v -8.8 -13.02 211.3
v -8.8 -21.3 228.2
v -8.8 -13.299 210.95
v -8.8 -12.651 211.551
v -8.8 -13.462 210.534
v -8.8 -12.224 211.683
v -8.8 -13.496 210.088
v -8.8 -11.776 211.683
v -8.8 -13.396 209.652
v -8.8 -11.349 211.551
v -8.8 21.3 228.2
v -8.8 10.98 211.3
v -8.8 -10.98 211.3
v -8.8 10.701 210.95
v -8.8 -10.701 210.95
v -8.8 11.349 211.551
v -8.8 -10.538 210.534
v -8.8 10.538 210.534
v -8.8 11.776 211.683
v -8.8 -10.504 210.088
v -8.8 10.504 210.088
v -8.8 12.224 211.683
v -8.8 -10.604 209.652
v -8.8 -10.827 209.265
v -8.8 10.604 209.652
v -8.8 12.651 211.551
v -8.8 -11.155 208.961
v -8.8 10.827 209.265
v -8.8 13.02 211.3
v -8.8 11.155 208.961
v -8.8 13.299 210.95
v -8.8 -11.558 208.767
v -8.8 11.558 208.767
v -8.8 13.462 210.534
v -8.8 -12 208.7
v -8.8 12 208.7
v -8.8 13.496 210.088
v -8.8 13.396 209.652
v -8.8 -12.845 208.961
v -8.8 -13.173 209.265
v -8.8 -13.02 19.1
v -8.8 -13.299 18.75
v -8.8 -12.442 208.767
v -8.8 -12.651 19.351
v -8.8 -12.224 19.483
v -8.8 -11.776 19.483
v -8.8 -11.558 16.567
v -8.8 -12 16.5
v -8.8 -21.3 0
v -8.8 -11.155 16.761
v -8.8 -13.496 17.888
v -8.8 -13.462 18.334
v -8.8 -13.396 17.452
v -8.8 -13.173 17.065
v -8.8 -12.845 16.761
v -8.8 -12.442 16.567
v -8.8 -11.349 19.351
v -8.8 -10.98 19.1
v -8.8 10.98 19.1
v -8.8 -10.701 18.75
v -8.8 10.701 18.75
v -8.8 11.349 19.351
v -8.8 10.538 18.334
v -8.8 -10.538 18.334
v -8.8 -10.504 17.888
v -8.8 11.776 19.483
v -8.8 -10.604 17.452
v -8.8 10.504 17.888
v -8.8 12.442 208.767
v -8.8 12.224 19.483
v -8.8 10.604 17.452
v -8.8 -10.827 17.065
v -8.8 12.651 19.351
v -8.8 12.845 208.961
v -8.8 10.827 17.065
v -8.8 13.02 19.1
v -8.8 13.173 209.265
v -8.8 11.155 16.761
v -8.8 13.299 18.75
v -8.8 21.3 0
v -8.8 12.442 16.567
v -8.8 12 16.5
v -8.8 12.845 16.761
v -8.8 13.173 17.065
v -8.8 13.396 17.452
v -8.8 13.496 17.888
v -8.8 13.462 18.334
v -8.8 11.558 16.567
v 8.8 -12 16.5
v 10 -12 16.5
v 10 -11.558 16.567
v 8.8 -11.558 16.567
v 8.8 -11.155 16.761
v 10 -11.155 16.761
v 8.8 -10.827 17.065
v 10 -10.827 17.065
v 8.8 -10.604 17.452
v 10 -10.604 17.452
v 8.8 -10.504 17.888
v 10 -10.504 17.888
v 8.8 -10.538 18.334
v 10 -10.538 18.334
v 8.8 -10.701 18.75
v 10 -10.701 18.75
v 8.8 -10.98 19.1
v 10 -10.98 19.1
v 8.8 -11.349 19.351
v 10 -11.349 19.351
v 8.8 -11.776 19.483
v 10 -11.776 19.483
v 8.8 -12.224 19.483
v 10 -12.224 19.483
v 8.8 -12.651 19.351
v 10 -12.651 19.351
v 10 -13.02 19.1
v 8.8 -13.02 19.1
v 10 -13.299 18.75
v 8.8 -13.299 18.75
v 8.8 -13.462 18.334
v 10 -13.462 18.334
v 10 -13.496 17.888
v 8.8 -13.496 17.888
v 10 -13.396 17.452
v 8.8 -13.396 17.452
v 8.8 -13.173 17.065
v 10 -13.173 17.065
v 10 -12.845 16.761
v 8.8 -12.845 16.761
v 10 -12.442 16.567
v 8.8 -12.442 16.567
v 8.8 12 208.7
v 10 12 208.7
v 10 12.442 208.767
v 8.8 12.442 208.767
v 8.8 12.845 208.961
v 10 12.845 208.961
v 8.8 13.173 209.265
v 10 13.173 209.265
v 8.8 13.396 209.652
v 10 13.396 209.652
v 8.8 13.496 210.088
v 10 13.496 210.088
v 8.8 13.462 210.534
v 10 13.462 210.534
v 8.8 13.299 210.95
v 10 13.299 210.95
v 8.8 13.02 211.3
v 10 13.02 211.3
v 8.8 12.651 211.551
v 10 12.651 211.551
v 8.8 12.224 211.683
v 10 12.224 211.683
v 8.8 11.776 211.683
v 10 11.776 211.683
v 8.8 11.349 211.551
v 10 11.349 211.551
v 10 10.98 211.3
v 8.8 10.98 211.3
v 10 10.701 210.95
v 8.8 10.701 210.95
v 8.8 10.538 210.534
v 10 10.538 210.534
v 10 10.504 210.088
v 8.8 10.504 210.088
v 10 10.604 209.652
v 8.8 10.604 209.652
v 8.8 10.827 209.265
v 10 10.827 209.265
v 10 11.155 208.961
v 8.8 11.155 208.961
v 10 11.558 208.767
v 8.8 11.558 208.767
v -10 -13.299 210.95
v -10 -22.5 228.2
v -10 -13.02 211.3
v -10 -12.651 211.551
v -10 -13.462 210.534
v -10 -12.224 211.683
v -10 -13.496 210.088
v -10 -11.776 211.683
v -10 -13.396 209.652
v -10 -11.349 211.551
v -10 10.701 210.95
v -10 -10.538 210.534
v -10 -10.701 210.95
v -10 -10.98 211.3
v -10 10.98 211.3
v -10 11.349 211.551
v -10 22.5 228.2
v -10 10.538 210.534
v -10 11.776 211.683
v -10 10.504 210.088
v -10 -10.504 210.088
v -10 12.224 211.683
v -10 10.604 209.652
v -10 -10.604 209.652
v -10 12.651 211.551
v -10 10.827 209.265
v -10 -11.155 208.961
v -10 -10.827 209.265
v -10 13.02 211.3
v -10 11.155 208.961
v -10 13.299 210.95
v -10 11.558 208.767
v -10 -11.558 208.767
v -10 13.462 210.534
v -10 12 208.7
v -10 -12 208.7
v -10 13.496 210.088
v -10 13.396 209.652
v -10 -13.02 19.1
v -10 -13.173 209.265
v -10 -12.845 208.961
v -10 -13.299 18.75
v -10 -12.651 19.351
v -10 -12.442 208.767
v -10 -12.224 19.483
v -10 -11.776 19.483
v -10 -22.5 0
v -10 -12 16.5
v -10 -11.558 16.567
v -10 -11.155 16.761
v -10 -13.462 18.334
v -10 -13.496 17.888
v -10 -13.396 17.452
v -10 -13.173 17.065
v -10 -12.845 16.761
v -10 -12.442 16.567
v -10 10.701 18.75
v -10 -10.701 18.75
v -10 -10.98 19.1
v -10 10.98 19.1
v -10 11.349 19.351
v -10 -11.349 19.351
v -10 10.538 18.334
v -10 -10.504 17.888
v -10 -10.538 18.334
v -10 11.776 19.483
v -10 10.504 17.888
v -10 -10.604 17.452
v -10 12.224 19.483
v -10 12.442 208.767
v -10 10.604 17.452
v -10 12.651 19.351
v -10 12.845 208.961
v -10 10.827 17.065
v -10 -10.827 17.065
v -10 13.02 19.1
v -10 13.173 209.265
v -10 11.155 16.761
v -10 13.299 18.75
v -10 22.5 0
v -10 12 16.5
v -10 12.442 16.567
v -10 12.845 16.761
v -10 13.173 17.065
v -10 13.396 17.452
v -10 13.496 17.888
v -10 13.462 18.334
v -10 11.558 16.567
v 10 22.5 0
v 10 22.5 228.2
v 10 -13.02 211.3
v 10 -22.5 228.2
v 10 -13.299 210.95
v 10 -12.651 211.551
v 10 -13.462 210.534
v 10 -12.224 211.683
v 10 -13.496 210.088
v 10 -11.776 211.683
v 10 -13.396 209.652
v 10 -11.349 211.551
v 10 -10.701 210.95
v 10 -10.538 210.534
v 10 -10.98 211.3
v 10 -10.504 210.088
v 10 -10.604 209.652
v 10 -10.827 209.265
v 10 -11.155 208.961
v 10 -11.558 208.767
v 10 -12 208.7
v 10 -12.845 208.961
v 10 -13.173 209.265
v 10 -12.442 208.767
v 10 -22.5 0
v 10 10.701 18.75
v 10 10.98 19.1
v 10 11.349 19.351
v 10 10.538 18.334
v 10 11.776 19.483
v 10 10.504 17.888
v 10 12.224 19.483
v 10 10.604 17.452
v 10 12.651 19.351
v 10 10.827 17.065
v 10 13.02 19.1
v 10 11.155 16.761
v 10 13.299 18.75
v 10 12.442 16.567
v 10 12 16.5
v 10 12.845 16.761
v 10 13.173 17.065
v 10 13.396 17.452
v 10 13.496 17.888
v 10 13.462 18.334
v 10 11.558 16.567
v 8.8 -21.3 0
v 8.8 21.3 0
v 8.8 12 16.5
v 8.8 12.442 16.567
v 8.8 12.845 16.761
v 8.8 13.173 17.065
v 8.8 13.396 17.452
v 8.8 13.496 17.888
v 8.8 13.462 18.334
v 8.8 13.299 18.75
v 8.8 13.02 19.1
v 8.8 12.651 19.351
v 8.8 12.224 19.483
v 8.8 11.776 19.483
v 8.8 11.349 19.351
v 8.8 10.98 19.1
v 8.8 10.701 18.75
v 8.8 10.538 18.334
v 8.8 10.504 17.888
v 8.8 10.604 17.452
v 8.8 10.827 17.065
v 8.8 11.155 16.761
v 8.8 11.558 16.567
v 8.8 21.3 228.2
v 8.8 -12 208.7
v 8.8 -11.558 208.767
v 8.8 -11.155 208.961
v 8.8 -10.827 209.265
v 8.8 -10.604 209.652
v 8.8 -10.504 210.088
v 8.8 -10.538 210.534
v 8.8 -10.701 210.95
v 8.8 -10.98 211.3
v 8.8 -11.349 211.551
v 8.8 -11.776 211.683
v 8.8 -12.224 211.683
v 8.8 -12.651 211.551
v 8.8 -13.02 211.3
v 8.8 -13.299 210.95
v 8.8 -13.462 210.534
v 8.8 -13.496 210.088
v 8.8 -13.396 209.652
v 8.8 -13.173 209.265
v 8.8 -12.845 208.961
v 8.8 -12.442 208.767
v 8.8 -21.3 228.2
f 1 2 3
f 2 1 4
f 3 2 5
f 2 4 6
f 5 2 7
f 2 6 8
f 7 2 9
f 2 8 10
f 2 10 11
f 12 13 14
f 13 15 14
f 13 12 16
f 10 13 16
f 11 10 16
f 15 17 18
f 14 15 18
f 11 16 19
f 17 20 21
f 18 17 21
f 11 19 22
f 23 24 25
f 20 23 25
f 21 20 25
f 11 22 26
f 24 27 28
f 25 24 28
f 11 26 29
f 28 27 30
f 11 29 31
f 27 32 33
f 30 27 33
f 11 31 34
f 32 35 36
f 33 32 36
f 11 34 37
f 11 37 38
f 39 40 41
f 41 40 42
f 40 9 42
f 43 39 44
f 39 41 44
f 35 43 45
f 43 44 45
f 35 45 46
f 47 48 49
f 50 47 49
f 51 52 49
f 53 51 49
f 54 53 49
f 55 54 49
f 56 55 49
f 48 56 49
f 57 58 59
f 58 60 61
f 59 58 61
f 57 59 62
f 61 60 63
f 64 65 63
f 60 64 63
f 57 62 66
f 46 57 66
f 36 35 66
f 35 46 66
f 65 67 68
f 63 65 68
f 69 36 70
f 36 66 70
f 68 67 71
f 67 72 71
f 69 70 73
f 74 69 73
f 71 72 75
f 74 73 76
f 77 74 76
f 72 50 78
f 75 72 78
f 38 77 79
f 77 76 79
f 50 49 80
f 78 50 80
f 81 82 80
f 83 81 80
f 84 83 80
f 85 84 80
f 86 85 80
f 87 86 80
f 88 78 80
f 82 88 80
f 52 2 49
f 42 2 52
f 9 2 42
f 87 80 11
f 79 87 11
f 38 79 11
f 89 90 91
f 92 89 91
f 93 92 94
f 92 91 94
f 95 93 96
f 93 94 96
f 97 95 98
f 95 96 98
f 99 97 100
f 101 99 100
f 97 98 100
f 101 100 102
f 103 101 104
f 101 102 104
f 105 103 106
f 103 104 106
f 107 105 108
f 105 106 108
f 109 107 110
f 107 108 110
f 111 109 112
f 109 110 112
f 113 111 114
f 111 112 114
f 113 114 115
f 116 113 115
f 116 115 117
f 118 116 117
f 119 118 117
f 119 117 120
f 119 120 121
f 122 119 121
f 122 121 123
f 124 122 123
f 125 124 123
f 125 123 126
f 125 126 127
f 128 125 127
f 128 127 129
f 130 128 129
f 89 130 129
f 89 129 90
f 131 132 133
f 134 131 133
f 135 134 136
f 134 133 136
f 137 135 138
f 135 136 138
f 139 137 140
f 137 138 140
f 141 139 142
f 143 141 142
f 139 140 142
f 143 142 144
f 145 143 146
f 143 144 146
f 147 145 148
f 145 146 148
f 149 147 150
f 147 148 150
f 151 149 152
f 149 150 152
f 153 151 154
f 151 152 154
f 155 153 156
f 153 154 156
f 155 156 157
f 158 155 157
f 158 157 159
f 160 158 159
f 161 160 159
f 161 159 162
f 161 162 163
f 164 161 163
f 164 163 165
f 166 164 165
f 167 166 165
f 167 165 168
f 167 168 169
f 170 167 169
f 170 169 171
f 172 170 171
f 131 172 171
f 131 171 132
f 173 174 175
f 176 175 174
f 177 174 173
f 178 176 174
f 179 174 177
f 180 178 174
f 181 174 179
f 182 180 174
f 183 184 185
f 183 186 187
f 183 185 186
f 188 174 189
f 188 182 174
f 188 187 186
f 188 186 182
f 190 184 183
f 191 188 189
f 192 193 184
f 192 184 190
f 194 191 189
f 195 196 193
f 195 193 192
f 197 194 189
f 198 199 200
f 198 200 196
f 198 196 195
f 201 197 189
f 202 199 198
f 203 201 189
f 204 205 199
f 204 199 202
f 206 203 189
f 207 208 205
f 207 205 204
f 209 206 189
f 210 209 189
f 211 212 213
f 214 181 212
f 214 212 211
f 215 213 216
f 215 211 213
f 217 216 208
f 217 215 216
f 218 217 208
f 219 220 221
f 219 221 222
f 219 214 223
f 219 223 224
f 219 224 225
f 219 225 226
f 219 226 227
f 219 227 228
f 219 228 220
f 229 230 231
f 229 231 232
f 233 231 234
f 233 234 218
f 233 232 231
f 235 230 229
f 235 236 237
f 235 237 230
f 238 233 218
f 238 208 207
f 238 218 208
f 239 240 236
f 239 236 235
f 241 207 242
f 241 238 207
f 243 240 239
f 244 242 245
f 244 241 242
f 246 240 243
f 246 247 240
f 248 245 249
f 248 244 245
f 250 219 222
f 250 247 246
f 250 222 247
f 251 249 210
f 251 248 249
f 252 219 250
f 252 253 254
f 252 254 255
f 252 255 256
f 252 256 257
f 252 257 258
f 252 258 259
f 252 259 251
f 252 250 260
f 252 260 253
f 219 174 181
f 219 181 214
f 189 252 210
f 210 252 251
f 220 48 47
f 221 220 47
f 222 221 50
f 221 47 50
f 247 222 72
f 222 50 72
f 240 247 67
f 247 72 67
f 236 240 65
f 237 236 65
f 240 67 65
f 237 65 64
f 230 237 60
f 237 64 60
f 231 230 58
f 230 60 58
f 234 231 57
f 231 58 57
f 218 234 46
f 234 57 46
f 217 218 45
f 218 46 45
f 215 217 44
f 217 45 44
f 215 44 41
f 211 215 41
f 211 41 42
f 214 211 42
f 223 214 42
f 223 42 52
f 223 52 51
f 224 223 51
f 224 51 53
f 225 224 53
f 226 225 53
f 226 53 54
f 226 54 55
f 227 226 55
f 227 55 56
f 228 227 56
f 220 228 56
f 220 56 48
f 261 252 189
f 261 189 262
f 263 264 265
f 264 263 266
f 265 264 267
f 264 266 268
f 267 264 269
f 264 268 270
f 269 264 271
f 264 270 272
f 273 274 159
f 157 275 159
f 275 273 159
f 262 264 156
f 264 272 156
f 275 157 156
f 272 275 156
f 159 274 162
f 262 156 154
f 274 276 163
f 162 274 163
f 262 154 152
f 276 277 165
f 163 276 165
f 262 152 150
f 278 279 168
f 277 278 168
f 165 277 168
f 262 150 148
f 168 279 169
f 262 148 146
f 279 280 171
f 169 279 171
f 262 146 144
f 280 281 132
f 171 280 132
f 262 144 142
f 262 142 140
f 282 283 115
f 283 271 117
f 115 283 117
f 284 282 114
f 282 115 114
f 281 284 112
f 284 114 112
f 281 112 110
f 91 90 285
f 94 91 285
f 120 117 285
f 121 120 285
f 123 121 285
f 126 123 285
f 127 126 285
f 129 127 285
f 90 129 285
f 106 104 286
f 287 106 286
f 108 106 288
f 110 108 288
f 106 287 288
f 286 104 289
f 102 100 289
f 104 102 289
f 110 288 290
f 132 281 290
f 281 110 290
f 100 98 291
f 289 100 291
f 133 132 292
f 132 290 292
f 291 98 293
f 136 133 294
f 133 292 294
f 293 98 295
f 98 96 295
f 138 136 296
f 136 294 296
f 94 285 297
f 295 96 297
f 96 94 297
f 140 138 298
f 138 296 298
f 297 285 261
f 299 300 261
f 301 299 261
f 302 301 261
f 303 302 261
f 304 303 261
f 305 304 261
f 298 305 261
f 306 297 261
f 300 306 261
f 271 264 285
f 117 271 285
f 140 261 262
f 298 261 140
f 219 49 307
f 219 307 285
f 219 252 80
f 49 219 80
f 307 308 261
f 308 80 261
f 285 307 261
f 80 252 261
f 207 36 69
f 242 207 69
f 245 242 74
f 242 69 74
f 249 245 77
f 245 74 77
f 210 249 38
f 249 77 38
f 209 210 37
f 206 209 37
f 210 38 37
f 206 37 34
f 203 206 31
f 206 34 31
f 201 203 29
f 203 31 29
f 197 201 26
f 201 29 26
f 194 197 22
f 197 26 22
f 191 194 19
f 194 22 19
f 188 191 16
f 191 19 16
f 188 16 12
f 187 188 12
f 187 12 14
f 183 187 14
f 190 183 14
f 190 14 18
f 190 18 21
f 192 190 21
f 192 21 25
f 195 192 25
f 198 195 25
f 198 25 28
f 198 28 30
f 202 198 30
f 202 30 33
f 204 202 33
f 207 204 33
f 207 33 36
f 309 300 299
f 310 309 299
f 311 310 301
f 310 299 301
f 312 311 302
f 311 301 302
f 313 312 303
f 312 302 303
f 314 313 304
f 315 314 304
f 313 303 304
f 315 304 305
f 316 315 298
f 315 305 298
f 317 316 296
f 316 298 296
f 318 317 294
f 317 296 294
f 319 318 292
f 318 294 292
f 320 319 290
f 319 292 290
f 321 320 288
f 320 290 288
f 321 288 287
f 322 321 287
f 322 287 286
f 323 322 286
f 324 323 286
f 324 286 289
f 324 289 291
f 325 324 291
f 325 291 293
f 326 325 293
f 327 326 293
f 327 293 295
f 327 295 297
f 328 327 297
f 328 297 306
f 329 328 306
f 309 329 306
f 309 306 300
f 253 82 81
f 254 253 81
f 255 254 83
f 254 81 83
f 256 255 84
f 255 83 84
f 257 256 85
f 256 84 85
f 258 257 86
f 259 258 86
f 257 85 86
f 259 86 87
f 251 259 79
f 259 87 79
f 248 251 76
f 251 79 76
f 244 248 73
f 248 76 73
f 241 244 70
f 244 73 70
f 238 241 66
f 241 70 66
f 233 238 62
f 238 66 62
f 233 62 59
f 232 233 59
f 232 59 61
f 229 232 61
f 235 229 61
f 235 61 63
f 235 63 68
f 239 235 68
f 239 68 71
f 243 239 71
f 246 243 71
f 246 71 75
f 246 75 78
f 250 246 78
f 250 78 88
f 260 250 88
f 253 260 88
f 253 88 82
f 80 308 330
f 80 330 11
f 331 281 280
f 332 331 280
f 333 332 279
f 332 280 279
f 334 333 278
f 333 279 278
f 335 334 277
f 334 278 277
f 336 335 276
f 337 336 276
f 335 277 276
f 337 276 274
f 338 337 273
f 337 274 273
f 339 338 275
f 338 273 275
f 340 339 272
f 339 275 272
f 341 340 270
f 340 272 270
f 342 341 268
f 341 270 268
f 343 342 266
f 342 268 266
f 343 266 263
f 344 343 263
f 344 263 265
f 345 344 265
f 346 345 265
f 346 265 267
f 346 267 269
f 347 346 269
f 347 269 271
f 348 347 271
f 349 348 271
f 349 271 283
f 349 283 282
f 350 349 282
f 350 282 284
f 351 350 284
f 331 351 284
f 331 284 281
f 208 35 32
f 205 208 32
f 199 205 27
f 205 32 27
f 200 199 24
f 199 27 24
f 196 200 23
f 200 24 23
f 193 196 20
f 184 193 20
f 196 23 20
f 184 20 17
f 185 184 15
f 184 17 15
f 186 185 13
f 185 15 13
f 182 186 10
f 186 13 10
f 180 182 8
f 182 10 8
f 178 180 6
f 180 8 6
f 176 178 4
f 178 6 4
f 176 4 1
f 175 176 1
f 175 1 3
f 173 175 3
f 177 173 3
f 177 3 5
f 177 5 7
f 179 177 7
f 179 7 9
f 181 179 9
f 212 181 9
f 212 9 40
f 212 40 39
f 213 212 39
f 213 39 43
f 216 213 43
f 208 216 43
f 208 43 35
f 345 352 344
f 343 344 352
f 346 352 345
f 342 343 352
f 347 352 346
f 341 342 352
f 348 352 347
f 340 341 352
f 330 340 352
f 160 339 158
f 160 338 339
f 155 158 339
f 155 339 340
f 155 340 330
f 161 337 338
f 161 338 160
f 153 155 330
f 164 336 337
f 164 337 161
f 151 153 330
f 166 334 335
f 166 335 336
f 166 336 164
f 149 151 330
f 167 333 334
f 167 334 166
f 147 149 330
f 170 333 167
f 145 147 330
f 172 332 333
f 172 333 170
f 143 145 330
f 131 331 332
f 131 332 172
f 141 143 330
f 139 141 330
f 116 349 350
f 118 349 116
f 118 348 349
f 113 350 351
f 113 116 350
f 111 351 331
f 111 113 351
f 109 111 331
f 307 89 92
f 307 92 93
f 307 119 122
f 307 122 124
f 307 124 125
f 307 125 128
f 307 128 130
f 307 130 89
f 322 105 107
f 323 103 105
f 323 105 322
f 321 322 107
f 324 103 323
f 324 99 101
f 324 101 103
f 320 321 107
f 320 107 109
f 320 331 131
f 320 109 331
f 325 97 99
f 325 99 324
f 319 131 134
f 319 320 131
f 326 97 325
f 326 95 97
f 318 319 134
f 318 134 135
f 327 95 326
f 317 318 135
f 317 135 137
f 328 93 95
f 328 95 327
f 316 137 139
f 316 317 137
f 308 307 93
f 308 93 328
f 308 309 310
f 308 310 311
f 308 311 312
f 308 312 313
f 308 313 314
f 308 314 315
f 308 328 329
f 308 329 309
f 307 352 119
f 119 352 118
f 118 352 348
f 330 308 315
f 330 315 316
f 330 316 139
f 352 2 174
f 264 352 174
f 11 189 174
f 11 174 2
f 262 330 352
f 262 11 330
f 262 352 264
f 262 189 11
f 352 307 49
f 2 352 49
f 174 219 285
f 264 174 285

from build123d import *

# Parameters (mm, degrees)
CROQUIS1_W              = 20
CROQUIS1_H              = 45
SALIENTE_EXTRUIR1_DEPTH = 228.2
CROQUIS5_W              = 17.6
CROQUIS5_H              = 42.6
CORTAR_EXTRUIR3_DEPTH   = 228.2
CROQUIS6_R              = 1.5
CORTAR_EXTRUIR4_DEPTH   = 30


with BuildPart() as part:
    # Croquis1 → Saliente-Extruir1 (new body)
    with BuildSketch(Plane.XY):
        Rectangle(CROQUIS1_W, CROQUIS1_H)
    extrude(amount=SALIENTE_EXTRUIR1_DEPTH)

    # Croquis5 → Cortar-Extruir3 (cut)
    with BuildSketch(Plane(origin=(0, 0, 0), x_dir=(-1, 0, 0), z_dir=(0, 0, -1))):
        Rectangle(CROQUIS5_W, CROQUIS5_H)
    extrude(amount=-CORTAR_EXTRUIR3_DEPTH, mode=Mode.SUBTRACT)

    # Croquis6 → Cortar-Extruir4 (cut)
    with BuildSketch(Plane(origin=(10, 0, 0), x_dir=(0, 0, -1), z_dir=(1, 0, 0))):
        with Locations((-210.2, -12)):
            Circle(CROQUIS6_R)
        with Locations((-210.2, 12)):
            Circle(CROQUIS6_R)
        with Locations((-18, 12)):
            Circle(CROQUIS6_R)
        with Locations((-18, -12)):
            Circle(CROQUIS6_R)
    extrude(amount=-CORTAR_EXTRUIR4_DEPTH, mode=Mode.SUBTRACT)


solid = part.part
